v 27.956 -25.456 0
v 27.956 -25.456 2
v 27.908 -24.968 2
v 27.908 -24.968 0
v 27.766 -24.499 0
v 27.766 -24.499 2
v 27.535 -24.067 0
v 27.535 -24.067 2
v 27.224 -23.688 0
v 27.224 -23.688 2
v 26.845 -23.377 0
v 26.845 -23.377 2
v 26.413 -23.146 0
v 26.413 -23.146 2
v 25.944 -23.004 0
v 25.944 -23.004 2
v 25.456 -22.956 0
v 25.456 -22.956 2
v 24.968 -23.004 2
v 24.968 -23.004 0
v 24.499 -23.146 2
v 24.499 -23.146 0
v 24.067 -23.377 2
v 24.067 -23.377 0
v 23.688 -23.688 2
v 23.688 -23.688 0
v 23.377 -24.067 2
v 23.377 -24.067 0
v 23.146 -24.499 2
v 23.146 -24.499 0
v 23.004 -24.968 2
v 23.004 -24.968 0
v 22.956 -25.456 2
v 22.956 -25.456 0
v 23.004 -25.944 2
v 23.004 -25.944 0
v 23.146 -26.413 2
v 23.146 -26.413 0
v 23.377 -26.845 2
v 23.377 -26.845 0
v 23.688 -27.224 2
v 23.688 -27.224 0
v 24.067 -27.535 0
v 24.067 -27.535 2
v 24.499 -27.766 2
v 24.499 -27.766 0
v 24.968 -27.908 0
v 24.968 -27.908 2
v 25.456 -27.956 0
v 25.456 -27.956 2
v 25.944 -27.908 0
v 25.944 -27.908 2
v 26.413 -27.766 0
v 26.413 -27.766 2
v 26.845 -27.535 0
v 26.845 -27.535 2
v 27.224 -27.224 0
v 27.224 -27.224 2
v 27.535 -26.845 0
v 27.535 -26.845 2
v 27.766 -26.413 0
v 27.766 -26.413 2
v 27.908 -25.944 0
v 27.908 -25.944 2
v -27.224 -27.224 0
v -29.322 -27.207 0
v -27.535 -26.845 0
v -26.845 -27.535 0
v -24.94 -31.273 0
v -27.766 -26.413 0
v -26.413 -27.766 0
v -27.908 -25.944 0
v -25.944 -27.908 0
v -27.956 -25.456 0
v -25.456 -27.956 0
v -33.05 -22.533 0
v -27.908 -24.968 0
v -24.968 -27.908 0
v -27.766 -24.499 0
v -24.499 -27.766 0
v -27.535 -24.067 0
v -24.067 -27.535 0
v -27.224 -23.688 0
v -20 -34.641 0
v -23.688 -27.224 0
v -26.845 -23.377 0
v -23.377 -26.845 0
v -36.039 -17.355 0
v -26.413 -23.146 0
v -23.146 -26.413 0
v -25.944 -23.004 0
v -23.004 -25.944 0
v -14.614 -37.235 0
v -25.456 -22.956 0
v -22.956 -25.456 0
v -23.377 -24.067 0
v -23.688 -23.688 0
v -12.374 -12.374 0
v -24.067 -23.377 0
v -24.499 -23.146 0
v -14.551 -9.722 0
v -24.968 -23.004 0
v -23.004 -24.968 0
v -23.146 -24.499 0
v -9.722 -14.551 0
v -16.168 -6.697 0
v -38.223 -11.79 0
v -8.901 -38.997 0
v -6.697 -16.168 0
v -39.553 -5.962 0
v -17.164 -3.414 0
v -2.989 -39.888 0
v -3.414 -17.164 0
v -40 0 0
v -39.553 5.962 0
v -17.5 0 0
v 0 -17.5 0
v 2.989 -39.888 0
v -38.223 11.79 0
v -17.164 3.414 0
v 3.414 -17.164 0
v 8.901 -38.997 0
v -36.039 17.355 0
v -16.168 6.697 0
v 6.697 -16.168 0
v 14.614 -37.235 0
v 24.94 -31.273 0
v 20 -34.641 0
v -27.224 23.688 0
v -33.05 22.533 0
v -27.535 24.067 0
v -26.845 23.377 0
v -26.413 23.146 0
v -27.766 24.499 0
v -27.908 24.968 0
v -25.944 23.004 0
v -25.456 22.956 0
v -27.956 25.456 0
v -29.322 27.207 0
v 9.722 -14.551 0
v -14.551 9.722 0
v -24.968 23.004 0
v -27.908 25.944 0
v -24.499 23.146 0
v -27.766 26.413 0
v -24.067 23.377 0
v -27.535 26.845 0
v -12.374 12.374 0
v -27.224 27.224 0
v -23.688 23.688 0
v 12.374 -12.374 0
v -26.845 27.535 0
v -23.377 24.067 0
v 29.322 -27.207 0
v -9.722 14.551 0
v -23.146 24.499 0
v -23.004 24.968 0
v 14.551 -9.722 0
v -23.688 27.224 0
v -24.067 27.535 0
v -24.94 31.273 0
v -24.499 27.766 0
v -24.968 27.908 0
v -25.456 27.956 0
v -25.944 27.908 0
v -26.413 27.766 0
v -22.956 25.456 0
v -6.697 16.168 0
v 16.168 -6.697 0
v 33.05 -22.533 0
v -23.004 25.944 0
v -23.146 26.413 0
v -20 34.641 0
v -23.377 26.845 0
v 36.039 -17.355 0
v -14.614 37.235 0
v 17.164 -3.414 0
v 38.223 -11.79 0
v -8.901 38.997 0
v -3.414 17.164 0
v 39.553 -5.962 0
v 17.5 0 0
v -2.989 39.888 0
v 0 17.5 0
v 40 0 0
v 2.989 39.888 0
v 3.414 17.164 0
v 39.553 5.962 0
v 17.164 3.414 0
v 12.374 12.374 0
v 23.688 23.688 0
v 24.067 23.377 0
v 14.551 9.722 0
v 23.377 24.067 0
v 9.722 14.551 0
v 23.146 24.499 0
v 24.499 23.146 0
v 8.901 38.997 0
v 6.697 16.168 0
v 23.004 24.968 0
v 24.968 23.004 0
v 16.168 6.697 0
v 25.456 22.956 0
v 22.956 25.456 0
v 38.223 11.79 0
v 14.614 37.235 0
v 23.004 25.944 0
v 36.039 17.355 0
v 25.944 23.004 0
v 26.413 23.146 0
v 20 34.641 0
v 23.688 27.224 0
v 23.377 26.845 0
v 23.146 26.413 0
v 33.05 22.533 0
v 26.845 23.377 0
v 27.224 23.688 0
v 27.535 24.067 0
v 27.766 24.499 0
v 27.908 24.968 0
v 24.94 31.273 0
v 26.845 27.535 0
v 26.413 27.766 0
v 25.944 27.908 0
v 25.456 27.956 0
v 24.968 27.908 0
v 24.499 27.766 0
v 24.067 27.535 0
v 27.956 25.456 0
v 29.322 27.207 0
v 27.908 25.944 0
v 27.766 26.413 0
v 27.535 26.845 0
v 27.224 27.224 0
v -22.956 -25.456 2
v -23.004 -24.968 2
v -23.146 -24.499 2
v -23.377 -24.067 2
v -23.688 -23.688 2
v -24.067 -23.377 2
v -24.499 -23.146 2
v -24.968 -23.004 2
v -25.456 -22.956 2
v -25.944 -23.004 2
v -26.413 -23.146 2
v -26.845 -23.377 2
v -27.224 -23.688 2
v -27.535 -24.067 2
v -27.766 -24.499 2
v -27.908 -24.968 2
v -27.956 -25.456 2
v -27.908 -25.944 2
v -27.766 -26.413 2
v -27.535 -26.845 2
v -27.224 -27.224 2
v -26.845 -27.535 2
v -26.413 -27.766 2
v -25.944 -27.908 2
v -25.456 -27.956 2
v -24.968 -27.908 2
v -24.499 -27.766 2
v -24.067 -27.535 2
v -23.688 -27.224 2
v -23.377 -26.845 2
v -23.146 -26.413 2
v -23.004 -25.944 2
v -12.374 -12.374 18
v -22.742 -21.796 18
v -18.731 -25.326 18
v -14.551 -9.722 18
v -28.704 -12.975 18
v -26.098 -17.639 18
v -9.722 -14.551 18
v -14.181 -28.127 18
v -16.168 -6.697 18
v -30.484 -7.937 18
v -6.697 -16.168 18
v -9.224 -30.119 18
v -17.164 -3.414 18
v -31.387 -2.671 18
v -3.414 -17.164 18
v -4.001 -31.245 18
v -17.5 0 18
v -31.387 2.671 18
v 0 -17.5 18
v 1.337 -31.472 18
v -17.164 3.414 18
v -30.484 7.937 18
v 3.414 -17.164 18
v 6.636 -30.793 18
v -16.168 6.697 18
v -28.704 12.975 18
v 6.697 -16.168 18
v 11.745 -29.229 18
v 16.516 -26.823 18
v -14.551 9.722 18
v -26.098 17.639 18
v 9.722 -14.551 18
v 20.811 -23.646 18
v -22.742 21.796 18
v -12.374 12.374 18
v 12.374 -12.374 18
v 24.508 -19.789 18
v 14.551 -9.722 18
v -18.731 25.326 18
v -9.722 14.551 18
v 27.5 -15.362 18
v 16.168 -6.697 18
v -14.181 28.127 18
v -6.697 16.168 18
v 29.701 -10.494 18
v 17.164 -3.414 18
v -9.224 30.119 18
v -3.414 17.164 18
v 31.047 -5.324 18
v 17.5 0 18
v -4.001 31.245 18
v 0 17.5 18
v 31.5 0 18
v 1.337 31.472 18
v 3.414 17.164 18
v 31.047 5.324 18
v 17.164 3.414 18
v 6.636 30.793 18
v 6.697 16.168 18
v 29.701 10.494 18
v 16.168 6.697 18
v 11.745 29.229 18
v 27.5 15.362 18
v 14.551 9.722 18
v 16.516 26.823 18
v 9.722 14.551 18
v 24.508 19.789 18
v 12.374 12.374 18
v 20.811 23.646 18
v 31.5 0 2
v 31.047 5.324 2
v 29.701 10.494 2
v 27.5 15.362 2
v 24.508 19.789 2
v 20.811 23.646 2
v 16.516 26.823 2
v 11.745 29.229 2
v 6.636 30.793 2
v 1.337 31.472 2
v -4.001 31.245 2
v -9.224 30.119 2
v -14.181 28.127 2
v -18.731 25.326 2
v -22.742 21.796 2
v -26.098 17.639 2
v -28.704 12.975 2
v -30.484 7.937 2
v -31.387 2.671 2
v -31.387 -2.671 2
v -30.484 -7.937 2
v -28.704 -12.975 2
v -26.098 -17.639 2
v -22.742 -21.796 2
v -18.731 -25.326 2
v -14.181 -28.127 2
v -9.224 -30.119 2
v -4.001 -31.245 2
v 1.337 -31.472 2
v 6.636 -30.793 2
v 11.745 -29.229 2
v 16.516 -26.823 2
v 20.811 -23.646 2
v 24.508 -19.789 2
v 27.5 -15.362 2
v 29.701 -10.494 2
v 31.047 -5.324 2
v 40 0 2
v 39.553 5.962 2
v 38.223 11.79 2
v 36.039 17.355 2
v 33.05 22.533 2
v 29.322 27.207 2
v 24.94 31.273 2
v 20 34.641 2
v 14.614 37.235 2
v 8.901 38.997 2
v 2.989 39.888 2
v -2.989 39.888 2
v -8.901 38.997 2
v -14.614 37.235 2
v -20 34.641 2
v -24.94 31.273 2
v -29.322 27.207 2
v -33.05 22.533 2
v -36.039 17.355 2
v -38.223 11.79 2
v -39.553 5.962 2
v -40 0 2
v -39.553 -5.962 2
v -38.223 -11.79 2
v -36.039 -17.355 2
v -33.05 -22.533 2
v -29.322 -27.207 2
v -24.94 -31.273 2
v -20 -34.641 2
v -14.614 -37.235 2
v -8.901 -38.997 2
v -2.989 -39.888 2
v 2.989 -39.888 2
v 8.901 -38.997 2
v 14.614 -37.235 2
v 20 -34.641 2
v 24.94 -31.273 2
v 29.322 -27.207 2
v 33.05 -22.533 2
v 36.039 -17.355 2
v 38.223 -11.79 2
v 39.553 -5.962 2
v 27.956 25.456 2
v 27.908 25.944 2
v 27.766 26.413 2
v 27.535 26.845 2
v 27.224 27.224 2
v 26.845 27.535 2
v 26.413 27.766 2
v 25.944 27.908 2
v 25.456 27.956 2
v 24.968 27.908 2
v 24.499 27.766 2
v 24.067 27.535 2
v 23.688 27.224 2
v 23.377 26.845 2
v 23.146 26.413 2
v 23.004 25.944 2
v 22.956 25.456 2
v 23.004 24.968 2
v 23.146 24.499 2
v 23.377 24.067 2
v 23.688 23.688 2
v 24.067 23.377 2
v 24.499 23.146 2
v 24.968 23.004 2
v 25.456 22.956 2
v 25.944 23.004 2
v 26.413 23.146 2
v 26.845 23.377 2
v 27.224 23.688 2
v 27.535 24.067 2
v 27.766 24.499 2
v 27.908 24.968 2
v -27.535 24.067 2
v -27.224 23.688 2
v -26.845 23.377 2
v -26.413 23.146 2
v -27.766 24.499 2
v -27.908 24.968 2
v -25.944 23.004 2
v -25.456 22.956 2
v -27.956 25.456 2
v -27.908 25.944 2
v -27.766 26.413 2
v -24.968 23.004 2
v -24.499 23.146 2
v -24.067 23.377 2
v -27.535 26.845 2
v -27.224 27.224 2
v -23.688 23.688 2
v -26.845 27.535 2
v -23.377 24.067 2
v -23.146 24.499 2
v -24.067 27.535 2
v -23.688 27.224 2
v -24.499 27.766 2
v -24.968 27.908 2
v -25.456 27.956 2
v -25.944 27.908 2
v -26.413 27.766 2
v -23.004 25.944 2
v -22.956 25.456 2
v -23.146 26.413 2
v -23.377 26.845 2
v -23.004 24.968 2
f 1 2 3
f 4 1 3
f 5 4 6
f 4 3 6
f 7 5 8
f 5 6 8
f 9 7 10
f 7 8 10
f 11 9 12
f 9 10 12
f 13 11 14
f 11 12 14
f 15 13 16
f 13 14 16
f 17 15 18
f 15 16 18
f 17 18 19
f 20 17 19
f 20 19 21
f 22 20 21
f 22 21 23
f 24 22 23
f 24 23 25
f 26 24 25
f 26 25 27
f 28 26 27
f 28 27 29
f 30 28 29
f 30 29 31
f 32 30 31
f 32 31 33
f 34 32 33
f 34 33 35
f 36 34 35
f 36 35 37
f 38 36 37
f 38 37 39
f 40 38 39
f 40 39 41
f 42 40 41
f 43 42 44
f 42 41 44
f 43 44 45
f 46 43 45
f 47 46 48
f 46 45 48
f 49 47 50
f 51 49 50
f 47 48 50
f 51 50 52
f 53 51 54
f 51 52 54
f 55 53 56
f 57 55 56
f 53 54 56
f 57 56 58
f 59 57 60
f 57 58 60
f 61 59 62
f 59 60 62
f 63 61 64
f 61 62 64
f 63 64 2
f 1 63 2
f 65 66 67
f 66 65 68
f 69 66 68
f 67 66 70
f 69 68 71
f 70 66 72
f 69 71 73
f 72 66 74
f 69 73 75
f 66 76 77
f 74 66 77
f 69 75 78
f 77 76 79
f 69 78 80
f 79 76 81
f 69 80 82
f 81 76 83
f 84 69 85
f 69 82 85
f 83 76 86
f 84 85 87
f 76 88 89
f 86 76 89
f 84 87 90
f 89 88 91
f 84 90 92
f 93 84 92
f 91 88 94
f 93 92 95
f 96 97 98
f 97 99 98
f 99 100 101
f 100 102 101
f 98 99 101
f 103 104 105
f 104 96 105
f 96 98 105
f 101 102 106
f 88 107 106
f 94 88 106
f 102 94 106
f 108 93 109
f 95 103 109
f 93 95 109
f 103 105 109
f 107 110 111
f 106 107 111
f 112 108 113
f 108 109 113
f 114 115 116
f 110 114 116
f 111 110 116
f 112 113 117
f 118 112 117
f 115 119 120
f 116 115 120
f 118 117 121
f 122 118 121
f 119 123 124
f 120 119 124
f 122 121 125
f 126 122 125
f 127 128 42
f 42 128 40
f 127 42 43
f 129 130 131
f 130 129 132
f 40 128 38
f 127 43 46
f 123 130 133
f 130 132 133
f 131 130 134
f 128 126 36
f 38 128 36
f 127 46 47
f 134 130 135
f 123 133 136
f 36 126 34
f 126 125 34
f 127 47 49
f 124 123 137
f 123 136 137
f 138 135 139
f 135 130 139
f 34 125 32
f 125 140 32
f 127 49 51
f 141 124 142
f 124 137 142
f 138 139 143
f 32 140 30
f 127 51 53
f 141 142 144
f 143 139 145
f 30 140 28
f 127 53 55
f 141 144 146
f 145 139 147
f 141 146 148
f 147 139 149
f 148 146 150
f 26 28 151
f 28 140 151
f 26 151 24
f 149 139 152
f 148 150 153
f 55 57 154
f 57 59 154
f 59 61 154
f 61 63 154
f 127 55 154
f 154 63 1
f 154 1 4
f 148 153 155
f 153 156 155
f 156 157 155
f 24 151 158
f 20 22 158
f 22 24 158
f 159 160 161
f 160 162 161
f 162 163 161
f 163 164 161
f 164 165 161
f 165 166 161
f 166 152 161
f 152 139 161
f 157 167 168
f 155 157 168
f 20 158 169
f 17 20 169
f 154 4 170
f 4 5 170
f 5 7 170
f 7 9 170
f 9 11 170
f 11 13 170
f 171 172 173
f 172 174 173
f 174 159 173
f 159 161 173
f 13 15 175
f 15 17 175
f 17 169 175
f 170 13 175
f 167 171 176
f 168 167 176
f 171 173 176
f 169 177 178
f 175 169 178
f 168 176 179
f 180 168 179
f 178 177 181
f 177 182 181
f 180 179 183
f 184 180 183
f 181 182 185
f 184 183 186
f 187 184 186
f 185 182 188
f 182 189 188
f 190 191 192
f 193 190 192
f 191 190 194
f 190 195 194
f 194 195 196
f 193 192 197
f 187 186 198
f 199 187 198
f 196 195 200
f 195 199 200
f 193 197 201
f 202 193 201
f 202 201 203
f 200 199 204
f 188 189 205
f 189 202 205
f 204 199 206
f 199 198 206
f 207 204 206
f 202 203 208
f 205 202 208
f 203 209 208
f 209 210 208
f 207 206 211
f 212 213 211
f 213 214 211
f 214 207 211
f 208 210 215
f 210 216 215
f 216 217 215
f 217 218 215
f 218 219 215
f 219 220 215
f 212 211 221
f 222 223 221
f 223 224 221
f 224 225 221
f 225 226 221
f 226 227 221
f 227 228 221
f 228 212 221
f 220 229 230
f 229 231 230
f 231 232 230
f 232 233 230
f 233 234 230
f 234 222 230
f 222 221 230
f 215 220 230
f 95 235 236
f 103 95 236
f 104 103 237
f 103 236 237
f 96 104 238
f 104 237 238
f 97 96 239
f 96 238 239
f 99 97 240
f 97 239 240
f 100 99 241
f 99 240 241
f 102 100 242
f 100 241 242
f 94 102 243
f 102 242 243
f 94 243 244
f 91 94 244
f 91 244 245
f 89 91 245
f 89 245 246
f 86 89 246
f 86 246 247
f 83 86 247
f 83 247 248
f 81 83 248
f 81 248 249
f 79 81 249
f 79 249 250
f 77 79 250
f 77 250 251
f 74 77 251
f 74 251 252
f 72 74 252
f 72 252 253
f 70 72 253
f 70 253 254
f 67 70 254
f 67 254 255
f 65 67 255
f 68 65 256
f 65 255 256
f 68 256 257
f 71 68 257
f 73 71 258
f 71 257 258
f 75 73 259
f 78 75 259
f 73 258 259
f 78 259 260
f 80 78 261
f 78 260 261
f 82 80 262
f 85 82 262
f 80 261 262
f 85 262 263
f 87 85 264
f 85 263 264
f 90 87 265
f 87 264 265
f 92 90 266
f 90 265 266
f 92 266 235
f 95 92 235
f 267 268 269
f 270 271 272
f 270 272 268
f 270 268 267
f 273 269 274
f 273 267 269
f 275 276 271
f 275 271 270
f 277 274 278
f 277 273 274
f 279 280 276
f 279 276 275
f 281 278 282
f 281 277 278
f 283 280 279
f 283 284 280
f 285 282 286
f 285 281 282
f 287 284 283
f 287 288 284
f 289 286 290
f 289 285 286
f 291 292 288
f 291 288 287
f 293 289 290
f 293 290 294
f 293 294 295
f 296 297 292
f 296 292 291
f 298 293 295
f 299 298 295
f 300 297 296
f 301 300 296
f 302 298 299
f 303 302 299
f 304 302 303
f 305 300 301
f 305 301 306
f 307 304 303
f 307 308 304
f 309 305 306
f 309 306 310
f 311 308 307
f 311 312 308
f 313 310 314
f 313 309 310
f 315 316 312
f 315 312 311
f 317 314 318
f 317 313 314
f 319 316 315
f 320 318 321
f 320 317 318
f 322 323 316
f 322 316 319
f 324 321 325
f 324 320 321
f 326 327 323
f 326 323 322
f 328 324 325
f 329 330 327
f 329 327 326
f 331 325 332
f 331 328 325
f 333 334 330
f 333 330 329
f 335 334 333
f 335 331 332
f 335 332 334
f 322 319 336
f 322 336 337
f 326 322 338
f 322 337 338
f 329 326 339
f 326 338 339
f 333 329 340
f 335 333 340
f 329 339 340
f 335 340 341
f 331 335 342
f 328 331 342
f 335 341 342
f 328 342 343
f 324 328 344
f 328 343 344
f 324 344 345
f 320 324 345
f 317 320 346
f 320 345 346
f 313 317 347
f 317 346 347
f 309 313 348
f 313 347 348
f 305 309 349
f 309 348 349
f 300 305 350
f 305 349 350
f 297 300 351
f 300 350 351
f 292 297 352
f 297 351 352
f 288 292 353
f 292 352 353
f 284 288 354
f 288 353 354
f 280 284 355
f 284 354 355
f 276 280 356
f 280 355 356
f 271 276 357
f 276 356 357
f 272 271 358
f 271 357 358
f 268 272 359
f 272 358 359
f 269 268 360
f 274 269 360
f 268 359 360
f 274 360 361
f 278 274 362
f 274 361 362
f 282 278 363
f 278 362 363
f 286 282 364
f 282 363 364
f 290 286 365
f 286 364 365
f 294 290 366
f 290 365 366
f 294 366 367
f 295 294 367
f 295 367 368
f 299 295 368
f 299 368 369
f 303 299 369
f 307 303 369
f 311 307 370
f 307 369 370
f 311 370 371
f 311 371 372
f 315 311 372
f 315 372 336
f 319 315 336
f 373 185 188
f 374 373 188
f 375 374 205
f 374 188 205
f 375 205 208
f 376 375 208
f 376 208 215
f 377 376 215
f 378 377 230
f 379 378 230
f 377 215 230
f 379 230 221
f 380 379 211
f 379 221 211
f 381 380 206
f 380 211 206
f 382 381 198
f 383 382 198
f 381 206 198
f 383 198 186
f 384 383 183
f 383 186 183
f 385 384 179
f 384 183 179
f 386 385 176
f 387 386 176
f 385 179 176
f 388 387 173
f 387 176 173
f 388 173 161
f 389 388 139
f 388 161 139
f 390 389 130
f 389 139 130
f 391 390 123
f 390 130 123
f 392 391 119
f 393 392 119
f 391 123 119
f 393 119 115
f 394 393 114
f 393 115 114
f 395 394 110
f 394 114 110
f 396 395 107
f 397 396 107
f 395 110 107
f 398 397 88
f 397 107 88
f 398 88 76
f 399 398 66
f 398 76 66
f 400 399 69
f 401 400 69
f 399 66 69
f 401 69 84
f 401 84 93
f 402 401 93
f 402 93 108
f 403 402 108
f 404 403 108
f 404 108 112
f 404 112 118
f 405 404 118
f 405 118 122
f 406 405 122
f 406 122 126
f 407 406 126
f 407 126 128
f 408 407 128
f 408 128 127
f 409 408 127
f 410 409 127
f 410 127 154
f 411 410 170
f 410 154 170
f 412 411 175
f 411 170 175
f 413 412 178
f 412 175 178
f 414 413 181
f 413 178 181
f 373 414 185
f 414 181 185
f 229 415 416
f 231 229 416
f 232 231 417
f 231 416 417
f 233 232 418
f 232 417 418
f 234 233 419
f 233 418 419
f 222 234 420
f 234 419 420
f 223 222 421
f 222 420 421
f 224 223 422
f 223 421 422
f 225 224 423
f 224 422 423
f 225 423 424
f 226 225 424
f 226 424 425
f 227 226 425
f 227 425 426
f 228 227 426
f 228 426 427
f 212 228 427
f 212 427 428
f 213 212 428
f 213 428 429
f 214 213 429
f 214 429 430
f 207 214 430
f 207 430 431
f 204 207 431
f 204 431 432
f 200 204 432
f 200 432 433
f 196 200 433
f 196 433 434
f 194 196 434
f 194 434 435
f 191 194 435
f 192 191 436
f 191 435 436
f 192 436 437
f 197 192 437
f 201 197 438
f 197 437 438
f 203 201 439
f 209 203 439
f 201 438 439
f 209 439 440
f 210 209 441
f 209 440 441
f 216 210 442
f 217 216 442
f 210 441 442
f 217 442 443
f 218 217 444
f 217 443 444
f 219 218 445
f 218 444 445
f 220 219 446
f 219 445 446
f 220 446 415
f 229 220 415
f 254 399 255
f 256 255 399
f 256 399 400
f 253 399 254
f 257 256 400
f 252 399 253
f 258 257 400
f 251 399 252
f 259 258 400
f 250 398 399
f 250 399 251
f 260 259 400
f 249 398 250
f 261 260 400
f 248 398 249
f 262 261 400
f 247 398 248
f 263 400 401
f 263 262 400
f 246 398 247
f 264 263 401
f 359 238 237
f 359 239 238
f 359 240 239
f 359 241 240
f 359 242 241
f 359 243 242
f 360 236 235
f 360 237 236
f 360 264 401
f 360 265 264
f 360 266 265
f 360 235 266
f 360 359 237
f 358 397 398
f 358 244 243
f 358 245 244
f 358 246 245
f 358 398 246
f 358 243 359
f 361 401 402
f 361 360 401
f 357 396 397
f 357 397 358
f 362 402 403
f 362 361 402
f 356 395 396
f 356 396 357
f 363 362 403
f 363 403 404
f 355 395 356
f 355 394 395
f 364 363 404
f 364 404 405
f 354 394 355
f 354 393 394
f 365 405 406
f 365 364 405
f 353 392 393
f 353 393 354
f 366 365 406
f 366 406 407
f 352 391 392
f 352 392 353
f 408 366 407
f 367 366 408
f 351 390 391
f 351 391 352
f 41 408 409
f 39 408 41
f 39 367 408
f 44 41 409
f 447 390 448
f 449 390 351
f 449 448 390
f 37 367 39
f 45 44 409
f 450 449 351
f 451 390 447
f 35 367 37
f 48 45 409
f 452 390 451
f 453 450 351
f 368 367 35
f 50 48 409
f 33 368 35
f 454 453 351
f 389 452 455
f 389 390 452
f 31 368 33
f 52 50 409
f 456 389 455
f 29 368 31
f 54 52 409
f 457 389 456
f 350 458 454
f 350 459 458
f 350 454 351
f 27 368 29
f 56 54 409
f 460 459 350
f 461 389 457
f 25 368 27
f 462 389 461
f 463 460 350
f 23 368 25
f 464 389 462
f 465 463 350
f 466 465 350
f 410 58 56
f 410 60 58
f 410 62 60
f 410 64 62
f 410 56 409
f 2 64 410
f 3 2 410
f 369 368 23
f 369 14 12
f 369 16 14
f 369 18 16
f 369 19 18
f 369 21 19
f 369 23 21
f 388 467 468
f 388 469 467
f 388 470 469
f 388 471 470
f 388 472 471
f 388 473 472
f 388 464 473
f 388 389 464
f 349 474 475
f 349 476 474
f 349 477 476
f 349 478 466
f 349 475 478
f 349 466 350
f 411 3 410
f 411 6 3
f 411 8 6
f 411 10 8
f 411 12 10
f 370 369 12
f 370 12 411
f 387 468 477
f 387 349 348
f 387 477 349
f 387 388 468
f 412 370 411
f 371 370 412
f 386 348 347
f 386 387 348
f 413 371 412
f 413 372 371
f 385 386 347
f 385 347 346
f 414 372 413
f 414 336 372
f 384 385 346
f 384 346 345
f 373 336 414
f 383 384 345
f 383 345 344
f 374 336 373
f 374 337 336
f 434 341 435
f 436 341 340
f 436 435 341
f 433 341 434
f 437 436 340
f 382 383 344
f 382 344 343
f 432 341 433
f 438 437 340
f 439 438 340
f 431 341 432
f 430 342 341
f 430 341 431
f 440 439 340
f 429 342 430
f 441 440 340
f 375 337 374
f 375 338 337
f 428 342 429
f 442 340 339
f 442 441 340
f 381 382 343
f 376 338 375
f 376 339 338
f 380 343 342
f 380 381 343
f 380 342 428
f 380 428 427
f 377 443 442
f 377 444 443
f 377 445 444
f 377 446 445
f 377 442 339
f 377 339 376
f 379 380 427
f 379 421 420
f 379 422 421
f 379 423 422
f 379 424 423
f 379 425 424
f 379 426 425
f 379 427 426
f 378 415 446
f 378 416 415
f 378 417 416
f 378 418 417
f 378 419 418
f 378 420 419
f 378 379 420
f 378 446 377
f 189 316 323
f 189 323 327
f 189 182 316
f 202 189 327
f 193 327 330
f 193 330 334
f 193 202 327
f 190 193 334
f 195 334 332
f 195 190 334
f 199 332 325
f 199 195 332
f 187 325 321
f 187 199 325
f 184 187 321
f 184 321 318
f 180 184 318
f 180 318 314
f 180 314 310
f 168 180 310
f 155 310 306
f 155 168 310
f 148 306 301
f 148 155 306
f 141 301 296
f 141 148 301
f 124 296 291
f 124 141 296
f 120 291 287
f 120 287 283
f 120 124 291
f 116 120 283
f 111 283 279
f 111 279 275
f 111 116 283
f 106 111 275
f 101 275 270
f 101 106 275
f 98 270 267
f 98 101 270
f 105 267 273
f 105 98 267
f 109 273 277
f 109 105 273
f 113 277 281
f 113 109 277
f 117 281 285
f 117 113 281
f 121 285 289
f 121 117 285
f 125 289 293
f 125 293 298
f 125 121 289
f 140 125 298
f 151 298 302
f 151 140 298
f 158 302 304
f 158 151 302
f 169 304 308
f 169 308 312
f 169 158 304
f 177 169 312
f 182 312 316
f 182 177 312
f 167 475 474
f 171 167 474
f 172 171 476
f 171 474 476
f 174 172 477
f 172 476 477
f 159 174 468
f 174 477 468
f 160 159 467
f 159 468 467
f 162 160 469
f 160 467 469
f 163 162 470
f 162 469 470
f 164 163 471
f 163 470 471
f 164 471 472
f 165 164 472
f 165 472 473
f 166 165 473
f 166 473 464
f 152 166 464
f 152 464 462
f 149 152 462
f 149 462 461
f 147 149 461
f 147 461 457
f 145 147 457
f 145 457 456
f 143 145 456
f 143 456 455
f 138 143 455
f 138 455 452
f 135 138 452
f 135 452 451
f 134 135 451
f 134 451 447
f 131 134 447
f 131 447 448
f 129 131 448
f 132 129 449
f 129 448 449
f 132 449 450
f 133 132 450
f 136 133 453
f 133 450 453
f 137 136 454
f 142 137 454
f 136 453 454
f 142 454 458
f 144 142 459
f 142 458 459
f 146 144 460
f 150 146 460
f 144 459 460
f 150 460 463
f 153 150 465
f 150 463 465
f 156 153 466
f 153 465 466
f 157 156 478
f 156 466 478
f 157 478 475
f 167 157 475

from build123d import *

# Parameters (mm, degrees)
SKETCH2_R           = 40
SKETCH2_R_2         = 17.5
BOSS_EXTRUDE1_DEPTH = 2
SKETCH3_R           = 31.5
SKETCH3_R_2         = 17.5
BOSS_EXTRUDE2_DEPTH = 16
SKETCH5_R           = 2.5
CUT_EXTRUDE1_DEPTH  = 59.787753827


with BuildPart() as part:
    # Sketch2 → Boss-Extrude1 (new body)
    with BuildSketch(Plane.XY):
        Circle(SKETCH2_R)
        Circle(SKETCH2_R_2, mode=Mode.SUBTRACT)
    extrude(amount=BOSS_EXTRUDE1_DEPTH)

    # Sketch3 → Boss-Extrude2 (add)
    with BuildSketch(Plane.XY.offset(2)):
        Circle(SKETCH3_R)
        Circle(SKETCH3_R_2, mode=Mode.SUBTRACT)
    extrude(amount=BOSS_EXTRUDE2_DEPTH)

    # Sketch5 → Cut-Extrude1 (cut, through all)
    with BuildSketch(Plane.XY.offset(2)):
        with Locations((25.455844123, 25.455844123)):
            Circle(SKETCH5_R)
        with Locations((25.455844123, -25.455844123)):
            Circle(SKETCH5_R)
        with Locations((-25.455844123, -25.455844123)):
            Circle(SKETCH5_R)
        with Locations((-25.455844123, 25.455844123)):
            Circle(SKETCH5_R)
    extrude(amount=-CUT_EXTRUDE1_DEPTH, mode=Mode.SUBTRACT)


solid = part.part
